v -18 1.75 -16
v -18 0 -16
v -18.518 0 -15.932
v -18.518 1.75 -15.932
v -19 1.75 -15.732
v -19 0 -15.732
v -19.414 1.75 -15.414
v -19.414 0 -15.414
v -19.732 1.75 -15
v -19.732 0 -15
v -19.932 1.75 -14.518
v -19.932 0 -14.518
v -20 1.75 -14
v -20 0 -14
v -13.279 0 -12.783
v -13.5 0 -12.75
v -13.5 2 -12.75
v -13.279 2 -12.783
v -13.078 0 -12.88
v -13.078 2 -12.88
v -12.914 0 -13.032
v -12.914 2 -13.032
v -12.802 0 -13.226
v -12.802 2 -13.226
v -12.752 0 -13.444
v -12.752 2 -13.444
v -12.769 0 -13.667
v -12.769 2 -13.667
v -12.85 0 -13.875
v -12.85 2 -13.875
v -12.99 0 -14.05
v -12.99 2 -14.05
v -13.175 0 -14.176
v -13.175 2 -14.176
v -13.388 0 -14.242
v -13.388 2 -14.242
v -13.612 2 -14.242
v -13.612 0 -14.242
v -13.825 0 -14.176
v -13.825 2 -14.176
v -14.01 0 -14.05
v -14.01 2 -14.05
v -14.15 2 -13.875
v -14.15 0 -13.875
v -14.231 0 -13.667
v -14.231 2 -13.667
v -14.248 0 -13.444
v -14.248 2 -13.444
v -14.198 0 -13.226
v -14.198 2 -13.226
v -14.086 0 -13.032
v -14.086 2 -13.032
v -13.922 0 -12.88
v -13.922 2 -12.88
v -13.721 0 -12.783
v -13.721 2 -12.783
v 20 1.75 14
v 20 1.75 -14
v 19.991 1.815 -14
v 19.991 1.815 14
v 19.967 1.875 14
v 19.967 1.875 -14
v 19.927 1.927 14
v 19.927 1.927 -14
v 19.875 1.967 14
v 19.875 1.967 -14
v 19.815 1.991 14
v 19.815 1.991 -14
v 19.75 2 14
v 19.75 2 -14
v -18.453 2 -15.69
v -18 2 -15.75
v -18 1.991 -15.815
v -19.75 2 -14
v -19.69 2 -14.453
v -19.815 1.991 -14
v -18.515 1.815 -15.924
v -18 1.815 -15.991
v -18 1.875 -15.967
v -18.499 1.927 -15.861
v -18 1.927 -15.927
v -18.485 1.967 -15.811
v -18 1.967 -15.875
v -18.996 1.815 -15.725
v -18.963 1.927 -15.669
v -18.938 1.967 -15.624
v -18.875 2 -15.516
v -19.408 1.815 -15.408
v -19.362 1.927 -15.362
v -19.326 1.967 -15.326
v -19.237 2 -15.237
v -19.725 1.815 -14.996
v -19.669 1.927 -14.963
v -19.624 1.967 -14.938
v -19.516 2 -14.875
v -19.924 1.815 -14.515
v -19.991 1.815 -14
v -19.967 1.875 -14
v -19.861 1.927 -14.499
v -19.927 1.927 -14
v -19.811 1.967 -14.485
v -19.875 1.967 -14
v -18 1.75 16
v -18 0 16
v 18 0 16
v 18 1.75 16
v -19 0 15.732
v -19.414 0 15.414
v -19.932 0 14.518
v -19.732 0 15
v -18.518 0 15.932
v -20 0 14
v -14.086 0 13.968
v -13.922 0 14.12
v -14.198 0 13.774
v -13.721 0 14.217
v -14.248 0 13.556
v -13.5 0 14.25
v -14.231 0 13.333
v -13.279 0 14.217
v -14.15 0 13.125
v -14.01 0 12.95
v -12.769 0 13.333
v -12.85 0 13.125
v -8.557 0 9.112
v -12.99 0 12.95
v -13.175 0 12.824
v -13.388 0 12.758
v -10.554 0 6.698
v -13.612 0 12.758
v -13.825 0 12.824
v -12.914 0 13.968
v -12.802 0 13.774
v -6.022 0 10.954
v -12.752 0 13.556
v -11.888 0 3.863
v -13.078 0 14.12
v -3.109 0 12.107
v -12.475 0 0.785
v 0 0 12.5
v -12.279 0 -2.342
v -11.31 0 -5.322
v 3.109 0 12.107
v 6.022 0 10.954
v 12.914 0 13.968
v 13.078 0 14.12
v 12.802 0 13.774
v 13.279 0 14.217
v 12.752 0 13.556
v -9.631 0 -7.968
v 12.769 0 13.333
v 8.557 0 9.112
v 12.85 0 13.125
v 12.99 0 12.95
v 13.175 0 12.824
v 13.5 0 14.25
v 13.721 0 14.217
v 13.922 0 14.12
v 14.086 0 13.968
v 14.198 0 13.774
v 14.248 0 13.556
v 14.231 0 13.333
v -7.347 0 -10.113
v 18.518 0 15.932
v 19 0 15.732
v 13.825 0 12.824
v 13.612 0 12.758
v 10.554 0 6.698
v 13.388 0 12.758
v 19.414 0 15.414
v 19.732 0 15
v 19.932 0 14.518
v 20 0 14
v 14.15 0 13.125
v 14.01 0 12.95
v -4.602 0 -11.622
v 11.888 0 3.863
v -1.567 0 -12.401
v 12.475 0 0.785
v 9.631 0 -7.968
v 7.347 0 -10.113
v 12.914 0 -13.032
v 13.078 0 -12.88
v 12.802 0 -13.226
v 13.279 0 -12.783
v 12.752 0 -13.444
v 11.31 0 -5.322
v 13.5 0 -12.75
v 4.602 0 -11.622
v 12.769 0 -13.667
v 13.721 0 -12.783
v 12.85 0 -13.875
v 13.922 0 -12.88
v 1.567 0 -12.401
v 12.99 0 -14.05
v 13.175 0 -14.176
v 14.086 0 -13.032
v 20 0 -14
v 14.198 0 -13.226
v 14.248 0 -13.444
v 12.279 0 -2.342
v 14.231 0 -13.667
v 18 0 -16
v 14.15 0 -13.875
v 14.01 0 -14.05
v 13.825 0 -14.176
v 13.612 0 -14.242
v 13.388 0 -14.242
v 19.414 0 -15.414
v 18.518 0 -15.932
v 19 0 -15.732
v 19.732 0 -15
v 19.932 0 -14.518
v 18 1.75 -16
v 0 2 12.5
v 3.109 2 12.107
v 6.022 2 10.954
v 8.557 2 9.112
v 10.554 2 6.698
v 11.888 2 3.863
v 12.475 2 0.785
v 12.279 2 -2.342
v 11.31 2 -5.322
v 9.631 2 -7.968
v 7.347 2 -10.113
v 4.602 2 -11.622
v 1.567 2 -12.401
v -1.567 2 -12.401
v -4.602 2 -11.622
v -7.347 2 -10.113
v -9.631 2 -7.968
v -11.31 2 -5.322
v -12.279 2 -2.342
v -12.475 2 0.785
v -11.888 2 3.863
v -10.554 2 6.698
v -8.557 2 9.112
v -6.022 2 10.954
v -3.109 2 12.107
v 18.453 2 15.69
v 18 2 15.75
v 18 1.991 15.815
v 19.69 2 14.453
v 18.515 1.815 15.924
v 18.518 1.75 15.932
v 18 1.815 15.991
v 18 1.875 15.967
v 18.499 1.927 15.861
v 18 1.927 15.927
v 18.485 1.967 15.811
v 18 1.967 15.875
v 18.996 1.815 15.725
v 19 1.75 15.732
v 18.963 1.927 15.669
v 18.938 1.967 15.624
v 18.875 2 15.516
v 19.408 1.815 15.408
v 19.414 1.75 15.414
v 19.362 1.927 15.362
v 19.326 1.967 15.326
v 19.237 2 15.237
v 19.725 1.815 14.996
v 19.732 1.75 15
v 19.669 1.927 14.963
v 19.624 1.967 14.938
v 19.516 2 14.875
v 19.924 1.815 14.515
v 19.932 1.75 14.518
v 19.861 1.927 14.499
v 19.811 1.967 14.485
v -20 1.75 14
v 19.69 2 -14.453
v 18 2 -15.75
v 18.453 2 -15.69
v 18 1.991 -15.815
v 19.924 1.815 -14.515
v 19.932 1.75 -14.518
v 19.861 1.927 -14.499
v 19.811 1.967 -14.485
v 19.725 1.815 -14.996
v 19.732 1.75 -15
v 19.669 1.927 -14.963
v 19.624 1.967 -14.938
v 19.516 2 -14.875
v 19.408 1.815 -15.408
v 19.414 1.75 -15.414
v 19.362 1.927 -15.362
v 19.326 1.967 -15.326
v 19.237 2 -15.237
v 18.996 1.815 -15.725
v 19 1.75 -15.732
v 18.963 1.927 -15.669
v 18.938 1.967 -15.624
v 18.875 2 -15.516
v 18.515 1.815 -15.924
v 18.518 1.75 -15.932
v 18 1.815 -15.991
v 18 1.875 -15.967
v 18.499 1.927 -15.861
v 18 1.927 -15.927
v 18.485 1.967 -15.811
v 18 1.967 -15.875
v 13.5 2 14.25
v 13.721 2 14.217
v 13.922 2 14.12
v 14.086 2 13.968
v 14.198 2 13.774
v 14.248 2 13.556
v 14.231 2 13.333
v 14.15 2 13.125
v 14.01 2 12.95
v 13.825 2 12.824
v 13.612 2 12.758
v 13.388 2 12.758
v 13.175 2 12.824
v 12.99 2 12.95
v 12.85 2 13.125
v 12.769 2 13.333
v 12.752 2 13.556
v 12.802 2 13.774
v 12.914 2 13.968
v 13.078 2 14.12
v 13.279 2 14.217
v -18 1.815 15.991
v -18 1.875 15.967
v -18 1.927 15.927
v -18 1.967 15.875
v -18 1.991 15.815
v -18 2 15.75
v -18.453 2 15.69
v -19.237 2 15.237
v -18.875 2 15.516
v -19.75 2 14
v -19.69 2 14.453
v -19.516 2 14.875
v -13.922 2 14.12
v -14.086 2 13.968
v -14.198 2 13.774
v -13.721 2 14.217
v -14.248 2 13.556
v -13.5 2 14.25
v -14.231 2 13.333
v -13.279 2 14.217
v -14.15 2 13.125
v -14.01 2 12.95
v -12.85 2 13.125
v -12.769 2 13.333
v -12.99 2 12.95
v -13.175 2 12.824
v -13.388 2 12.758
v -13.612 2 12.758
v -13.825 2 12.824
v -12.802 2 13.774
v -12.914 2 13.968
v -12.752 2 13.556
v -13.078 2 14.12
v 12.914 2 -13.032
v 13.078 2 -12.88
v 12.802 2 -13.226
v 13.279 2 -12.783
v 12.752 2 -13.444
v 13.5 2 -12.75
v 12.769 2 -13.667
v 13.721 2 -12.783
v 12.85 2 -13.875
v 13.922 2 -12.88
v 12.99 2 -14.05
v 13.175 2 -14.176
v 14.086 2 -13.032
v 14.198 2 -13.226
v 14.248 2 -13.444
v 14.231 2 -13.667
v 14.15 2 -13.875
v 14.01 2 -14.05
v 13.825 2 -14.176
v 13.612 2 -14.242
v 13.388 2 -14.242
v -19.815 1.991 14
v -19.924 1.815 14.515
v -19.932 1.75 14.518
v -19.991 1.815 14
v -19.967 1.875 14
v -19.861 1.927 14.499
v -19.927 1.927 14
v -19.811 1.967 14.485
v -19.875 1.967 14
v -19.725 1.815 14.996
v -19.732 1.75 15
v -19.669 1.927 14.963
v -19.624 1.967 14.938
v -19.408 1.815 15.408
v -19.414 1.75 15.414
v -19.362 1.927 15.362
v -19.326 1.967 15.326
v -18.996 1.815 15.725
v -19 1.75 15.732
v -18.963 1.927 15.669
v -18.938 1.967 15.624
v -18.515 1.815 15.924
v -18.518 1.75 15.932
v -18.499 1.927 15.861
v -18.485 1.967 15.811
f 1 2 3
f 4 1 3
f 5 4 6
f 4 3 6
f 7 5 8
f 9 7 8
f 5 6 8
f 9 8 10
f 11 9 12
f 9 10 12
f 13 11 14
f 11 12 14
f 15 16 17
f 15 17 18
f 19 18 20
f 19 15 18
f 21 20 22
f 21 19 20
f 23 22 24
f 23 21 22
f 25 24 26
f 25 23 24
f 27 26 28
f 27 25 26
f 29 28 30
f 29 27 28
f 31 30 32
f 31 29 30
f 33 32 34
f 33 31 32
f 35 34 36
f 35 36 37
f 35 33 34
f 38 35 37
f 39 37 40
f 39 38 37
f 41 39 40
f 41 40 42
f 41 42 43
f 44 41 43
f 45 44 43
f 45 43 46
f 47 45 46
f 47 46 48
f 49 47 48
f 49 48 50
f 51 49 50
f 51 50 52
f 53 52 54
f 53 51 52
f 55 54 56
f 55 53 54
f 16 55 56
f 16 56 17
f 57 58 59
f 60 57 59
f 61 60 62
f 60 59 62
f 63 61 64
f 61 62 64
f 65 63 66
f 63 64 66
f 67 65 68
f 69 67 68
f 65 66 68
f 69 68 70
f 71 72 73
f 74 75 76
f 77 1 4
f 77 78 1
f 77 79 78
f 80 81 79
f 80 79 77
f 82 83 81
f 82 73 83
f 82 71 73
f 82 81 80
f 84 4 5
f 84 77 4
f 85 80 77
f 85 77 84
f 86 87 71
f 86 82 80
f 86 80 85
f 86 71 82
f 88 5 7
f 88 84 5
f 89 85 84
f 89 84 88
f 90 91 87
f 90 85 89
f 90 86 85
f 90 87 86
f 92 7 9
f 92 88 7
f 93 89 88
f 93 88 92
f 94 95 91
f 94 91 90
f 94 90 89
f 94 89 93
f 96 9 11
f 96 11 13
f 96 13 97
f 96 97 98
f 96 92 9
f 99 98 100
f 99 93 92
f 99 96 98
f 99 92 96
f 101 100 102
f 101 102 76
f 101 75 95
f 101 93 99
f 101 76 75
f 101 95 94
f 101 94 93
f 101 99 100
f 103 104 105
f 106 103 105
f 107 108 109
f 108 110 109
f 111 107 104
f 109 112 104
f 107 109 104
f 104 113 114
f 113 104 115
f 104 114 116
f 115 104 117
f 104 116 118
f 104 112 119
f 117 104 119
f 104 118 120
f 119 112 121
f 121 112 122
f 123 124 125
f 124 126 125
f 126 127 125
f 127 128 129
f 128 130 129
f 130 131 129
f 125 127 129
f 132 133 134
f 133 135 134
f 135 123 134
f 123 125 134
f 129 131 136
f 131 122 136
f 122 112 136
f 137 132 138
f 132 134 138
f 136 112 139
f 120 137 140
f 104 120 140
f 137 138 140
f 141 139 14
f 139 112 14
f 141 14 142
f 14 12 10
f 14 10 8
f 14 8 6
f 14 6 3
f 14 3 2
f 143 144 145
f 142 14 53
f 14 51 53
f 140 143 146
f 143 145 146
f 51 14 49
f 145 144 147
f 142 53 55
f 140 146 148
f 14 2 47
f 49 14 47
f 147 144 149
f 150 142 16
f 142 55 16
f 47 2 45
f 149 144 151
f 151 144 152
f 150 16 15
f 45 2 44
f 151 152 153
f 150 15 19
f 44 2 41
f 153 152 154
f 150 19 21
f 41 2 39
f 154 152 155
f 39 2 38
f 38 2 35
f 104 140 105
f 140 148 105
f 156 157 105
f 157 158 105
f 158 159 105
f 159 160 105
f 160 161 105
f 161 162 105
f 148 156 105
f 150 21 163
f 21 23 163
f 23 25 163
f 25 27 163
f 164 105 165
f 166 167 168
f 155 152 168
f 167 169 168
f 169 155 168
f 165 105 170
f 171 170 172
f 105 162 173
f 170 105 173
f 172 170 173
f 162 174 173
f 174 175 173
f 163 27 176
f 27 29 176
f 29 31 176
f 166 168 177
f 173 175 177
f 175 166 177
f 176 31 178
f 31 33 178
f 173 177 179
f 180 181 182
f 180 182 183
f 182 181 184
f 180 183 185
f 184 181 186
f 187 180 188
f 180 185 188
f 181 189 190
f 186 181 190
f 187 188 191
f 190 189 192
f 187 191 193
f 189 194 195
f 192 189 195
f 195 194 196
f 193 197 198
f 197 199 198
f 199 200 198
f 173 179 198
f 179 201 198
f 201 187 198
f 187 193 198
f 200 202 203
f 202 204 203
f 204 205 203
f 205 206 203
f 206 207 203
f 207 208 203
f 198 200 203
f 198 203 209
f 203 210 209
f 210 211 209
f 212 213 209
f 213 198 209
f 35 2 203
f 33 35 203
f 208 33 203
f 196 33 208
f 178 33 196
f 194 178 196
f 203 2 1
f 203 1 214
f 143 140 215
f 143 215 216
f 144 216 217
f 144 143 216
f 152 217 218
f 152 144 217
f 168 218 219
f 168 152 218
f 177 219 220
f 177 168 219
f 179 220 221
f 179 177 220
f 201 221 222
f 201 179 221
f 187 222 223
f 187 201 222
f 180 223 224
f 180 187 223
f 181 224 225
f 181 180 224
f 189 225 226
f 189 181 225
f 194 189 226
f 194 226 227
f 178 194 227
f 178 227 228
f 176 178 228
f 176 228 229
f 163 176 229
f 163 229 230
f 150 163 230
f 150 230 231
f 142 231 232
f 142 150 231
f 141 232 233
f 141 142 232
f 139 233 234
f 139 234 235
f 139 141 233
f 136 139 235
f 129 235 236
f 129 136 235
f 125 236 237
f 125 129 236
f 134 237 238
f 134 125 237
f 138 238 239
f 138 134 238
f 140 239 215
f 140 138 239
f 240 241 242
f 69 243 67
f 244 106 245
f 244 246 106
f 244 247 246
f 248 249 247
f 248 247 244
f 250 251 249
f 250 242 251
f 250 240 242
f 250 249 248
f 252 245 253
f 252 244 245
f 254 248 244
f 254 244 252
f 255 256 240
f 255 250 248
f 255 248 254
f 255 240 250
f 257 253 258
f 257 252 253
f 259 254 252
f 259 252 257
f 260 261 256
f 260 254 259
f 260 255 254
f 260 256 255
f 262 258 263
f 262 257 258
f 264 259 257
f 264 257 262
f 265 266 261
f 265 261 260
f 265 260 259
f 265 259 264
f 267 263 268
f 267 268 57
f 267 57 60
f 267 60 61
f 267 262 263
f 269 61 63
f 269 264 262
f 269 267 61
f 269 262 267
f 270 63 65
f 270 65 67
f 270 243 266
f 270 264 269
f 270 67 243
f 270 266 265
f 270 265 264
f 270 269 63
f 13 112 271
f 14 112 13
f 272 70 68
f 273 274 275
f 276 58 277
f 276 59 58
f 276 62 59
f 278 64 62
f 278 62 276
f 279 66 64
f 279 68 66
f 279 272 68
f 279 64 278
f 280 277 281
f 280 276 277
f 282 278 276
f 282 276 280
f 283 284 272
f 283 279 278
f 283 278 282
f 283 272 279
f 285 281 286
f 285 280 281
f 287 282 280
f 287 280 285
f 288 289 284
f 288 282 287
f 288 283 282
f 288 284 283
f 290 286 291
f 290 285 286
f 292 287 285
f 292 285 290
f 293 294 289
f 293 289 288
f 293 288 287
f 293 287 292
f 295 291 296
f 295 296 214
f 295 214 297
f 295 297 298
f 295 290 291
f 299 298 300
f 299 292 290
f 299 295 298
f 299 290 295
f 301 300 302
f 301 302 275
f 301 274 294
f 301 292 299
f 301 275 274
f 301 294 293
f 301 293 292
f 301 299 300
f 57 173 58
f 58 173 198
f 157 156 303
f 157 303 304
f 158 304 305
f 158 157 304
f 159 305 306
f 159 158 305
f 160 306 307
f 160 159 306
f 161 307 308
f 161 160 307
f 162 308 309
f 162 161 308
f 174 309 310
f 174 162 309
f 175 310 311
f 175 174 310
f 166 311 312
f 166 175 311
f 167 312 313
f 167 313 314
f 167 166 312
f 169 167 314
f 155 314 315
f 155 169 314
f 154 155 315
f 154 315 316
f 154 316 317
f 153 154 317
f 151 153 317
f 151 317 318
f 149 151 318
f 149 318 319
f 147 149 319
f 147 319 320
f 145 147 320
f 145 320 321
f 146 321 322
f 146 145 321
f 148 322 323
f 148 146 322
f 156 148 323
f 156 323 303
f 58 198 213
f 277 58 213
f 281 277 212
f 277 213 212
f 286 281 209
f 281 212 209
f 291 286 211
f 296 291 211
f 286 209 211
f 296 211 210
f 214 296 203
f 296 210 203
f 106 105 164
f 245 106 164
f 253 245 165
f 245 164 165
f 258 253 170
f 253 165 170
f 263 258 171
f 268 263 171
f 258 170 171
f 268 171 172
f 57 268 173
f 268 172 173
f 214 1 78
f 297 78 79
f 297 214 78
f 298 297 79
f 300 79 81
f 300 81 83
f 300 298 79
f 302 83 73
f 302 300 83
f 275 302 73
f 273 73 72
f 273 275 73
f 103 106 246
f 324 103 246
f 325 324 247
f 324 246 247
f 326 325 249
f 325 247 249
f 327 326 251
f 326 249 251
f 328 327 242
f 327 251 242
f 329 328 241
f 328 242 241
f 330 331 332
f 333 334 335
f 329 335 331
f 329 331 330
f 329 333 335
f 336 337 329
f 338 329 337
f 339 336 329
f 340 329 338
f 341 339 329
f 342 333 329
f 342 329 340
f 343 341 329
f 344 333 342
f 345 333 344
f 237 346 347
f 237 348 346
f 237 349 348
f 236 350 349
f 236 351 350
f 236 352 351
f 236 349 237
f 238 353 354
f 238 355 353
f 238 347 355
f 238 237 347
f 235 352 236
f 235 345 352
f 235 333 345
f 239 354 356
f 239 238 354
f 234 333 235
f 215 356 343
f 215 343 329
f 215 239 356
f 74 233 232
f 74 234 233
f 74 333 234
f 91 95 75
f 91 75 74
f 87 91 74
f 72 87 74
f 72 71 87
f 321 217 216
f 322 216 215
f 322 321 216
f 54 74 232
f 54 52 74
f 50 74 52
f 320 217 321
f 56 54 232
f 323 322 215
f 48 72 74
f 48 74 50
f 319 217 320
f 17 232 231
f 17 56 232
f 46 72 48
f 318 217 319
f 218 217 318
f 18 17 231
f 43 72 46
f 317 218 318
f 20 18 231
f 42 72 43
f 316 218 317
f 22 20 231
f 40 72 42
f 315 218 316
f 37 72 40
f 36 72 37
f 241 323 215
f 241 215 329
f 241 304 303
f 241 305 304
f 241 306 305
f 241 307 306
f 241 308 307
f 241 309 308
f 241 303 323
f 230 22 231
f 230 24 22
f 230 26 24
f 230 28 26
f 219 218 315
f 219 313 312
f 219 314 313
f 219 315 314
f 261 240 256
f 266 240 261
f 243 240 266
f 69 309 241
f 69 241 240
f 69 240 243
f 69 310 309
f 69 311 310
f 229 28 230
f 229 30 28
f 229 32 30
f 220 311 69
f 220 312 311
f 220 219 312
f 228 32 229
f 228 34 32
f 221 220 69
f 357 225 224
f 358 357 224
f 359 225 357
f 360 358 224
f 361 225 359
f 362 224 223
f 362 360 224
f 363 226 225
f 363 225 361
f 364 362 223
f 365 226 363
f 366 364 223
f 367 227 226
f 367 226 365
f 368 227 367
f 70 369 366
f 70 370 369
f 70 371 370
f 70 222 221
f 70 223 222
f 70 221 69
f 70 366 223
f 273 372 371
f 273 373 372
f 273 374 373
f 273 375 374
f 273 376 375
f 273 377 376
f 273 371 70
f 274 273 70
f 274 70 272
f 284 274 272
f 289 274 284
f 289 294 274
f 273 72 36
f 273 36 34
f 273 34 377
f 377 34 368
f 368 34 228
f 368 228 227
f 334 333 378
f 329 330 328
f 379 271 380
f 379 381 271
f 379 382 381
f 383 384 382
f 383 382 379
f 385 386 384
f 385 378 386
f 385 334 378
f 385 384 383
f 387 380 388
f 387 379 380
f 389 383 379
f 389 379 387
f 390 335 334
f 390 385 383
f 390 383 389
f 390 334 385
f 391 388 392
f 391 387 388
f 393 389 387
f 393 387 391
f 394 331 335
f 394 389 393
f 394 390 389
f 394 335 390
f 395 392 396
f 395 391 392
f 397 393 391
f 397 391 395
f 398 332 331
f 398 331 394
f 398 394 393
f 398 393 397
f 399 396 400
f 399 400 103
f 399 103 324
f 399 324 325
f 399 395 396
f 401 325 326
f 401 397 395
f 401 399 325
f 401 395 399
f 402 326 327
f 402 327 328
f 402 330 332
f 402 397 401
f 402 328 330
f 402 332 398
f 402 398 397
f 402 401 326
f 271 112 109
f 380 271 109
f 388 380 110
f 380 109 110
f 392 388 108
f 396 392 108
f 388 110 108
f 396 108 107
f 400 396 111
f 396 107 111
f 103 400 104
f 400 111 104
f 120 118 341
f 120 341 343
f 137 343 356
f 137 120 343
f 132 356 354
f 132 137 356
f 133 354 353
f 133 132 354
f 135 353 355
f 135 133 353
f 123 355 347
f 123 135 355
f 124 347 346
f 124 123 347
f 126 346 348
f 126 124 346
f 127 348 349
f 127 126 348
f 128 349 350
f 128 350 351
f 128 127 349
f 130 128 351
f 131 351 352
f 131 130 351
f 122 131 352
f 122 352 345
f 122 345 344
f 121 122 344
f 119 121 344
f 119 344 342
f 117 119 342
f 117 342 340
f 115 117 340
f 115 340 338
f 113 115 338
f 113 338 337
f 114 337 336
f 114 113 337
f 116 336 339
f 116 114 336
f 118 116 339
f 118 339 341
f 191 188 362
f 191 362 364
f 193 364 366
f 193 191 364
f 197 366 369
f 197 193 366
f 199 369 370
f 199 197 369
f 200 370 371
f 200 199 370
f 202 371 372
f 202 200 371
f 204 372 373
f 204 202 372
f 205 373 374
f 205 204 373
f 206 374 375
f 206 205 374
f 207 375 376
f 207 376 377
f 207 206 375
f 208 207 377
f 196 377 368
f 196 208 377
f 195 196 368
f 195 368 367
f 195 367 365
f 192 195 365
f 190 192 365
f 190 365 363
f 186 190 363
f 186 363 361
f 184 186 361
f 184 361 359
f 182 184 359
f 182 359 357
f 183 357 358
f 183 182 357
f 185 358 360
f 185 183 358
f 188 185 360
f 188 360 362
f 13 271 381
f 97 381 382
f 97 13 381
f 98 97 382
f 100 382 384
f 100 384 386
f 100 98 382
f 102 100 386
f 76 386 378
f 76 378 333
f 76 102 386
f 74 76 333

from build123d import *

# Parameters (mm, degrees)
SKETCH1_W           = 40
SKETCH1_H           = 32
SKETCH1_R           = 12.5
SKETCH1_R_2         = 0.75
BOSS_EXTRUDE1_DEPTH = 2
FILLET1_R           = 0.25
FILLET2_R           = 2


with BuildPart() as part:
    # Sketch1 → Boss-Extrude1 (new body)
    with BuildSketch(Plane(origin=(0, 0, 0), x_dir=(1, 0, 0), z_dir=(0, 1, 0))):
        Rectangle(SKETCH1_W, SKETCH1_H)
        with Locations(Location((0, 0, 0), (0, 0, 270))):
            Circle(SKETCH1_R, mode=Mode.SUBTRACT)
        with Locations(Location((-13.5, 13.5, 0), (0, 0, 270))):
            Circle(SKETCH1_R_2, mode=Mode.SUBTRACT)
        with Locations(Location((13.5, 13.5, 0), (0, 0, 270))):
            Circle(SKETCH1_R_2, mode=Mode.SUBTRACT)
        with Locations(Location((13.5, -13.5, 0), (0, 0, 270))):
            Circle(SKETCH1_R_2, mode=Mode.SUBTRACT)
        with Locations(Location((-13.5, -13.5, 0), (0, 0, 270))):
            Circle(SKETCH1_R_2, mode=Mode.SUBTRACT)
    extrude(amount=BOSS_EXTRUDE1_DEPTH)

    # Fillet1
    fillet1_edges = [part.edges().sort_by_distance(p)[0] for p in [
        (-20, 2, 0),
        (0, 2, 16),
        (20, 2, 0),
        (0, 2, -16),
    ]]
    fillet(fillet1_edges, radius=FILLET1_R)

    # Fillet2
    # the kernel refuses this fillet: 2 mm, written as the material it takes off along each edge
    with BuildSketch(Plane(origin=(-18, 2, 14), x_dir=(-1, 0, 0), z_dir=(0, 0, -1))) as fillet2_piece_1:
        with BuildLine():
            CenterArc((1.75, -0.25), 0.25, 0, 90)
            Line((2, -0.25), (2, 0))
            Line((2, 0), (1.75, 0))
        make_face()
    revolve(axis=Axis((-18, 2, 14), (0, 1, 0)), revolution_arc=90, mode=Mode.SUBTRACT)
    with BuildSketch(Plane(origin=(-18, 2, -14), x_dir=(0, 0, -1), z_dir=(1, 0, 0))) as fillet2_piece_2:
        with BuildLine():
            CenterArc((1.75, -0.25), 0.25, 0, 90)
            Line((2, -0.25), (2, 0))
            Line((2, 0), (1.75, 0))
        make_face()
    revolve(axis=Axis((-18, 2, -14), (0, 1, 0)), revolution_arc=90, mode=Mode.SUBTRACT)
    with BuildSketch(Plane(origin=(18, 2, 14), x_dir=(0, 0, 1), z_dir=(-1, 0, 0))) as fillet2_piece_3:
        with BuildLine():
            CenterArc((1.75, -0.25), 0.25, 0, 90)
            Line((2, -0.25), (2, 0))
            Line((2, 0), (1.75, 0))
        make_face()
    revolve(axis=Axis((18, 2, 14), (0, 1, 0)), revolution_arc=90, mode=Mode.SUBTRACT)
    with BuildSketch(Plane(origin=(18, 2, -14), x_dir=(1, 0, 0), z_dir=(0, 0, 1))) as fillet2_piece_4:
        with BuildLine():
            CenterArc((1.75, -0.25), 0.25, 0, 90)
            Line((2, -0.25), (2, 0))
            Line((2, 0), (1.75, 0))
        make_face()
    revolve(axis=Axis((18, 2, -14), (0, 1, 0)), revolution_arc=90, mode=Mode.SUBTRACT)
    with BuildSketch(Plane(origin=(20, -5, -16), x_dir=(0, 0, 1), z_dir=(0, 1, 0)), Plane(origin=(20, -5, 16), x_dir=(-1, 0, 0), z_dir=(0, 1, 0))) as fillet2_piece_5:
        with BuildLine():
            CenterArc((FILLET2_R, -FILLET2_R), FILLET2_R, 90, 90)
            Line((0, -FILLET2_R), (0, 0))
            Line((0, 0), (FILLET2_R, 0))
        make_face()
    extrude(amount=7, mode=Mode.SUBTRACT)
    with BuildSketch(Plane(origin=(-20, -5, -16), x_dir=(0, 0, 1), z_dir=(0, 1, 0)), Plane(origin=(-20, -5, 16), x_dir=(1, 0, 0), z_dir=(0, 1, 0))) as fillet2_piece_6:
        with BuildLine():
            CenterArc((FILLET2_R, FILLET2_R), FILLET2_R, 180, 90)
            Line((0, FILLET2_R), (0, 0))
            Line((0, 0), (FILLET2_R, 0))
        make_face()
    extrude(amount=7, mode=Mode.SUBTRACT)


solid = part.part
